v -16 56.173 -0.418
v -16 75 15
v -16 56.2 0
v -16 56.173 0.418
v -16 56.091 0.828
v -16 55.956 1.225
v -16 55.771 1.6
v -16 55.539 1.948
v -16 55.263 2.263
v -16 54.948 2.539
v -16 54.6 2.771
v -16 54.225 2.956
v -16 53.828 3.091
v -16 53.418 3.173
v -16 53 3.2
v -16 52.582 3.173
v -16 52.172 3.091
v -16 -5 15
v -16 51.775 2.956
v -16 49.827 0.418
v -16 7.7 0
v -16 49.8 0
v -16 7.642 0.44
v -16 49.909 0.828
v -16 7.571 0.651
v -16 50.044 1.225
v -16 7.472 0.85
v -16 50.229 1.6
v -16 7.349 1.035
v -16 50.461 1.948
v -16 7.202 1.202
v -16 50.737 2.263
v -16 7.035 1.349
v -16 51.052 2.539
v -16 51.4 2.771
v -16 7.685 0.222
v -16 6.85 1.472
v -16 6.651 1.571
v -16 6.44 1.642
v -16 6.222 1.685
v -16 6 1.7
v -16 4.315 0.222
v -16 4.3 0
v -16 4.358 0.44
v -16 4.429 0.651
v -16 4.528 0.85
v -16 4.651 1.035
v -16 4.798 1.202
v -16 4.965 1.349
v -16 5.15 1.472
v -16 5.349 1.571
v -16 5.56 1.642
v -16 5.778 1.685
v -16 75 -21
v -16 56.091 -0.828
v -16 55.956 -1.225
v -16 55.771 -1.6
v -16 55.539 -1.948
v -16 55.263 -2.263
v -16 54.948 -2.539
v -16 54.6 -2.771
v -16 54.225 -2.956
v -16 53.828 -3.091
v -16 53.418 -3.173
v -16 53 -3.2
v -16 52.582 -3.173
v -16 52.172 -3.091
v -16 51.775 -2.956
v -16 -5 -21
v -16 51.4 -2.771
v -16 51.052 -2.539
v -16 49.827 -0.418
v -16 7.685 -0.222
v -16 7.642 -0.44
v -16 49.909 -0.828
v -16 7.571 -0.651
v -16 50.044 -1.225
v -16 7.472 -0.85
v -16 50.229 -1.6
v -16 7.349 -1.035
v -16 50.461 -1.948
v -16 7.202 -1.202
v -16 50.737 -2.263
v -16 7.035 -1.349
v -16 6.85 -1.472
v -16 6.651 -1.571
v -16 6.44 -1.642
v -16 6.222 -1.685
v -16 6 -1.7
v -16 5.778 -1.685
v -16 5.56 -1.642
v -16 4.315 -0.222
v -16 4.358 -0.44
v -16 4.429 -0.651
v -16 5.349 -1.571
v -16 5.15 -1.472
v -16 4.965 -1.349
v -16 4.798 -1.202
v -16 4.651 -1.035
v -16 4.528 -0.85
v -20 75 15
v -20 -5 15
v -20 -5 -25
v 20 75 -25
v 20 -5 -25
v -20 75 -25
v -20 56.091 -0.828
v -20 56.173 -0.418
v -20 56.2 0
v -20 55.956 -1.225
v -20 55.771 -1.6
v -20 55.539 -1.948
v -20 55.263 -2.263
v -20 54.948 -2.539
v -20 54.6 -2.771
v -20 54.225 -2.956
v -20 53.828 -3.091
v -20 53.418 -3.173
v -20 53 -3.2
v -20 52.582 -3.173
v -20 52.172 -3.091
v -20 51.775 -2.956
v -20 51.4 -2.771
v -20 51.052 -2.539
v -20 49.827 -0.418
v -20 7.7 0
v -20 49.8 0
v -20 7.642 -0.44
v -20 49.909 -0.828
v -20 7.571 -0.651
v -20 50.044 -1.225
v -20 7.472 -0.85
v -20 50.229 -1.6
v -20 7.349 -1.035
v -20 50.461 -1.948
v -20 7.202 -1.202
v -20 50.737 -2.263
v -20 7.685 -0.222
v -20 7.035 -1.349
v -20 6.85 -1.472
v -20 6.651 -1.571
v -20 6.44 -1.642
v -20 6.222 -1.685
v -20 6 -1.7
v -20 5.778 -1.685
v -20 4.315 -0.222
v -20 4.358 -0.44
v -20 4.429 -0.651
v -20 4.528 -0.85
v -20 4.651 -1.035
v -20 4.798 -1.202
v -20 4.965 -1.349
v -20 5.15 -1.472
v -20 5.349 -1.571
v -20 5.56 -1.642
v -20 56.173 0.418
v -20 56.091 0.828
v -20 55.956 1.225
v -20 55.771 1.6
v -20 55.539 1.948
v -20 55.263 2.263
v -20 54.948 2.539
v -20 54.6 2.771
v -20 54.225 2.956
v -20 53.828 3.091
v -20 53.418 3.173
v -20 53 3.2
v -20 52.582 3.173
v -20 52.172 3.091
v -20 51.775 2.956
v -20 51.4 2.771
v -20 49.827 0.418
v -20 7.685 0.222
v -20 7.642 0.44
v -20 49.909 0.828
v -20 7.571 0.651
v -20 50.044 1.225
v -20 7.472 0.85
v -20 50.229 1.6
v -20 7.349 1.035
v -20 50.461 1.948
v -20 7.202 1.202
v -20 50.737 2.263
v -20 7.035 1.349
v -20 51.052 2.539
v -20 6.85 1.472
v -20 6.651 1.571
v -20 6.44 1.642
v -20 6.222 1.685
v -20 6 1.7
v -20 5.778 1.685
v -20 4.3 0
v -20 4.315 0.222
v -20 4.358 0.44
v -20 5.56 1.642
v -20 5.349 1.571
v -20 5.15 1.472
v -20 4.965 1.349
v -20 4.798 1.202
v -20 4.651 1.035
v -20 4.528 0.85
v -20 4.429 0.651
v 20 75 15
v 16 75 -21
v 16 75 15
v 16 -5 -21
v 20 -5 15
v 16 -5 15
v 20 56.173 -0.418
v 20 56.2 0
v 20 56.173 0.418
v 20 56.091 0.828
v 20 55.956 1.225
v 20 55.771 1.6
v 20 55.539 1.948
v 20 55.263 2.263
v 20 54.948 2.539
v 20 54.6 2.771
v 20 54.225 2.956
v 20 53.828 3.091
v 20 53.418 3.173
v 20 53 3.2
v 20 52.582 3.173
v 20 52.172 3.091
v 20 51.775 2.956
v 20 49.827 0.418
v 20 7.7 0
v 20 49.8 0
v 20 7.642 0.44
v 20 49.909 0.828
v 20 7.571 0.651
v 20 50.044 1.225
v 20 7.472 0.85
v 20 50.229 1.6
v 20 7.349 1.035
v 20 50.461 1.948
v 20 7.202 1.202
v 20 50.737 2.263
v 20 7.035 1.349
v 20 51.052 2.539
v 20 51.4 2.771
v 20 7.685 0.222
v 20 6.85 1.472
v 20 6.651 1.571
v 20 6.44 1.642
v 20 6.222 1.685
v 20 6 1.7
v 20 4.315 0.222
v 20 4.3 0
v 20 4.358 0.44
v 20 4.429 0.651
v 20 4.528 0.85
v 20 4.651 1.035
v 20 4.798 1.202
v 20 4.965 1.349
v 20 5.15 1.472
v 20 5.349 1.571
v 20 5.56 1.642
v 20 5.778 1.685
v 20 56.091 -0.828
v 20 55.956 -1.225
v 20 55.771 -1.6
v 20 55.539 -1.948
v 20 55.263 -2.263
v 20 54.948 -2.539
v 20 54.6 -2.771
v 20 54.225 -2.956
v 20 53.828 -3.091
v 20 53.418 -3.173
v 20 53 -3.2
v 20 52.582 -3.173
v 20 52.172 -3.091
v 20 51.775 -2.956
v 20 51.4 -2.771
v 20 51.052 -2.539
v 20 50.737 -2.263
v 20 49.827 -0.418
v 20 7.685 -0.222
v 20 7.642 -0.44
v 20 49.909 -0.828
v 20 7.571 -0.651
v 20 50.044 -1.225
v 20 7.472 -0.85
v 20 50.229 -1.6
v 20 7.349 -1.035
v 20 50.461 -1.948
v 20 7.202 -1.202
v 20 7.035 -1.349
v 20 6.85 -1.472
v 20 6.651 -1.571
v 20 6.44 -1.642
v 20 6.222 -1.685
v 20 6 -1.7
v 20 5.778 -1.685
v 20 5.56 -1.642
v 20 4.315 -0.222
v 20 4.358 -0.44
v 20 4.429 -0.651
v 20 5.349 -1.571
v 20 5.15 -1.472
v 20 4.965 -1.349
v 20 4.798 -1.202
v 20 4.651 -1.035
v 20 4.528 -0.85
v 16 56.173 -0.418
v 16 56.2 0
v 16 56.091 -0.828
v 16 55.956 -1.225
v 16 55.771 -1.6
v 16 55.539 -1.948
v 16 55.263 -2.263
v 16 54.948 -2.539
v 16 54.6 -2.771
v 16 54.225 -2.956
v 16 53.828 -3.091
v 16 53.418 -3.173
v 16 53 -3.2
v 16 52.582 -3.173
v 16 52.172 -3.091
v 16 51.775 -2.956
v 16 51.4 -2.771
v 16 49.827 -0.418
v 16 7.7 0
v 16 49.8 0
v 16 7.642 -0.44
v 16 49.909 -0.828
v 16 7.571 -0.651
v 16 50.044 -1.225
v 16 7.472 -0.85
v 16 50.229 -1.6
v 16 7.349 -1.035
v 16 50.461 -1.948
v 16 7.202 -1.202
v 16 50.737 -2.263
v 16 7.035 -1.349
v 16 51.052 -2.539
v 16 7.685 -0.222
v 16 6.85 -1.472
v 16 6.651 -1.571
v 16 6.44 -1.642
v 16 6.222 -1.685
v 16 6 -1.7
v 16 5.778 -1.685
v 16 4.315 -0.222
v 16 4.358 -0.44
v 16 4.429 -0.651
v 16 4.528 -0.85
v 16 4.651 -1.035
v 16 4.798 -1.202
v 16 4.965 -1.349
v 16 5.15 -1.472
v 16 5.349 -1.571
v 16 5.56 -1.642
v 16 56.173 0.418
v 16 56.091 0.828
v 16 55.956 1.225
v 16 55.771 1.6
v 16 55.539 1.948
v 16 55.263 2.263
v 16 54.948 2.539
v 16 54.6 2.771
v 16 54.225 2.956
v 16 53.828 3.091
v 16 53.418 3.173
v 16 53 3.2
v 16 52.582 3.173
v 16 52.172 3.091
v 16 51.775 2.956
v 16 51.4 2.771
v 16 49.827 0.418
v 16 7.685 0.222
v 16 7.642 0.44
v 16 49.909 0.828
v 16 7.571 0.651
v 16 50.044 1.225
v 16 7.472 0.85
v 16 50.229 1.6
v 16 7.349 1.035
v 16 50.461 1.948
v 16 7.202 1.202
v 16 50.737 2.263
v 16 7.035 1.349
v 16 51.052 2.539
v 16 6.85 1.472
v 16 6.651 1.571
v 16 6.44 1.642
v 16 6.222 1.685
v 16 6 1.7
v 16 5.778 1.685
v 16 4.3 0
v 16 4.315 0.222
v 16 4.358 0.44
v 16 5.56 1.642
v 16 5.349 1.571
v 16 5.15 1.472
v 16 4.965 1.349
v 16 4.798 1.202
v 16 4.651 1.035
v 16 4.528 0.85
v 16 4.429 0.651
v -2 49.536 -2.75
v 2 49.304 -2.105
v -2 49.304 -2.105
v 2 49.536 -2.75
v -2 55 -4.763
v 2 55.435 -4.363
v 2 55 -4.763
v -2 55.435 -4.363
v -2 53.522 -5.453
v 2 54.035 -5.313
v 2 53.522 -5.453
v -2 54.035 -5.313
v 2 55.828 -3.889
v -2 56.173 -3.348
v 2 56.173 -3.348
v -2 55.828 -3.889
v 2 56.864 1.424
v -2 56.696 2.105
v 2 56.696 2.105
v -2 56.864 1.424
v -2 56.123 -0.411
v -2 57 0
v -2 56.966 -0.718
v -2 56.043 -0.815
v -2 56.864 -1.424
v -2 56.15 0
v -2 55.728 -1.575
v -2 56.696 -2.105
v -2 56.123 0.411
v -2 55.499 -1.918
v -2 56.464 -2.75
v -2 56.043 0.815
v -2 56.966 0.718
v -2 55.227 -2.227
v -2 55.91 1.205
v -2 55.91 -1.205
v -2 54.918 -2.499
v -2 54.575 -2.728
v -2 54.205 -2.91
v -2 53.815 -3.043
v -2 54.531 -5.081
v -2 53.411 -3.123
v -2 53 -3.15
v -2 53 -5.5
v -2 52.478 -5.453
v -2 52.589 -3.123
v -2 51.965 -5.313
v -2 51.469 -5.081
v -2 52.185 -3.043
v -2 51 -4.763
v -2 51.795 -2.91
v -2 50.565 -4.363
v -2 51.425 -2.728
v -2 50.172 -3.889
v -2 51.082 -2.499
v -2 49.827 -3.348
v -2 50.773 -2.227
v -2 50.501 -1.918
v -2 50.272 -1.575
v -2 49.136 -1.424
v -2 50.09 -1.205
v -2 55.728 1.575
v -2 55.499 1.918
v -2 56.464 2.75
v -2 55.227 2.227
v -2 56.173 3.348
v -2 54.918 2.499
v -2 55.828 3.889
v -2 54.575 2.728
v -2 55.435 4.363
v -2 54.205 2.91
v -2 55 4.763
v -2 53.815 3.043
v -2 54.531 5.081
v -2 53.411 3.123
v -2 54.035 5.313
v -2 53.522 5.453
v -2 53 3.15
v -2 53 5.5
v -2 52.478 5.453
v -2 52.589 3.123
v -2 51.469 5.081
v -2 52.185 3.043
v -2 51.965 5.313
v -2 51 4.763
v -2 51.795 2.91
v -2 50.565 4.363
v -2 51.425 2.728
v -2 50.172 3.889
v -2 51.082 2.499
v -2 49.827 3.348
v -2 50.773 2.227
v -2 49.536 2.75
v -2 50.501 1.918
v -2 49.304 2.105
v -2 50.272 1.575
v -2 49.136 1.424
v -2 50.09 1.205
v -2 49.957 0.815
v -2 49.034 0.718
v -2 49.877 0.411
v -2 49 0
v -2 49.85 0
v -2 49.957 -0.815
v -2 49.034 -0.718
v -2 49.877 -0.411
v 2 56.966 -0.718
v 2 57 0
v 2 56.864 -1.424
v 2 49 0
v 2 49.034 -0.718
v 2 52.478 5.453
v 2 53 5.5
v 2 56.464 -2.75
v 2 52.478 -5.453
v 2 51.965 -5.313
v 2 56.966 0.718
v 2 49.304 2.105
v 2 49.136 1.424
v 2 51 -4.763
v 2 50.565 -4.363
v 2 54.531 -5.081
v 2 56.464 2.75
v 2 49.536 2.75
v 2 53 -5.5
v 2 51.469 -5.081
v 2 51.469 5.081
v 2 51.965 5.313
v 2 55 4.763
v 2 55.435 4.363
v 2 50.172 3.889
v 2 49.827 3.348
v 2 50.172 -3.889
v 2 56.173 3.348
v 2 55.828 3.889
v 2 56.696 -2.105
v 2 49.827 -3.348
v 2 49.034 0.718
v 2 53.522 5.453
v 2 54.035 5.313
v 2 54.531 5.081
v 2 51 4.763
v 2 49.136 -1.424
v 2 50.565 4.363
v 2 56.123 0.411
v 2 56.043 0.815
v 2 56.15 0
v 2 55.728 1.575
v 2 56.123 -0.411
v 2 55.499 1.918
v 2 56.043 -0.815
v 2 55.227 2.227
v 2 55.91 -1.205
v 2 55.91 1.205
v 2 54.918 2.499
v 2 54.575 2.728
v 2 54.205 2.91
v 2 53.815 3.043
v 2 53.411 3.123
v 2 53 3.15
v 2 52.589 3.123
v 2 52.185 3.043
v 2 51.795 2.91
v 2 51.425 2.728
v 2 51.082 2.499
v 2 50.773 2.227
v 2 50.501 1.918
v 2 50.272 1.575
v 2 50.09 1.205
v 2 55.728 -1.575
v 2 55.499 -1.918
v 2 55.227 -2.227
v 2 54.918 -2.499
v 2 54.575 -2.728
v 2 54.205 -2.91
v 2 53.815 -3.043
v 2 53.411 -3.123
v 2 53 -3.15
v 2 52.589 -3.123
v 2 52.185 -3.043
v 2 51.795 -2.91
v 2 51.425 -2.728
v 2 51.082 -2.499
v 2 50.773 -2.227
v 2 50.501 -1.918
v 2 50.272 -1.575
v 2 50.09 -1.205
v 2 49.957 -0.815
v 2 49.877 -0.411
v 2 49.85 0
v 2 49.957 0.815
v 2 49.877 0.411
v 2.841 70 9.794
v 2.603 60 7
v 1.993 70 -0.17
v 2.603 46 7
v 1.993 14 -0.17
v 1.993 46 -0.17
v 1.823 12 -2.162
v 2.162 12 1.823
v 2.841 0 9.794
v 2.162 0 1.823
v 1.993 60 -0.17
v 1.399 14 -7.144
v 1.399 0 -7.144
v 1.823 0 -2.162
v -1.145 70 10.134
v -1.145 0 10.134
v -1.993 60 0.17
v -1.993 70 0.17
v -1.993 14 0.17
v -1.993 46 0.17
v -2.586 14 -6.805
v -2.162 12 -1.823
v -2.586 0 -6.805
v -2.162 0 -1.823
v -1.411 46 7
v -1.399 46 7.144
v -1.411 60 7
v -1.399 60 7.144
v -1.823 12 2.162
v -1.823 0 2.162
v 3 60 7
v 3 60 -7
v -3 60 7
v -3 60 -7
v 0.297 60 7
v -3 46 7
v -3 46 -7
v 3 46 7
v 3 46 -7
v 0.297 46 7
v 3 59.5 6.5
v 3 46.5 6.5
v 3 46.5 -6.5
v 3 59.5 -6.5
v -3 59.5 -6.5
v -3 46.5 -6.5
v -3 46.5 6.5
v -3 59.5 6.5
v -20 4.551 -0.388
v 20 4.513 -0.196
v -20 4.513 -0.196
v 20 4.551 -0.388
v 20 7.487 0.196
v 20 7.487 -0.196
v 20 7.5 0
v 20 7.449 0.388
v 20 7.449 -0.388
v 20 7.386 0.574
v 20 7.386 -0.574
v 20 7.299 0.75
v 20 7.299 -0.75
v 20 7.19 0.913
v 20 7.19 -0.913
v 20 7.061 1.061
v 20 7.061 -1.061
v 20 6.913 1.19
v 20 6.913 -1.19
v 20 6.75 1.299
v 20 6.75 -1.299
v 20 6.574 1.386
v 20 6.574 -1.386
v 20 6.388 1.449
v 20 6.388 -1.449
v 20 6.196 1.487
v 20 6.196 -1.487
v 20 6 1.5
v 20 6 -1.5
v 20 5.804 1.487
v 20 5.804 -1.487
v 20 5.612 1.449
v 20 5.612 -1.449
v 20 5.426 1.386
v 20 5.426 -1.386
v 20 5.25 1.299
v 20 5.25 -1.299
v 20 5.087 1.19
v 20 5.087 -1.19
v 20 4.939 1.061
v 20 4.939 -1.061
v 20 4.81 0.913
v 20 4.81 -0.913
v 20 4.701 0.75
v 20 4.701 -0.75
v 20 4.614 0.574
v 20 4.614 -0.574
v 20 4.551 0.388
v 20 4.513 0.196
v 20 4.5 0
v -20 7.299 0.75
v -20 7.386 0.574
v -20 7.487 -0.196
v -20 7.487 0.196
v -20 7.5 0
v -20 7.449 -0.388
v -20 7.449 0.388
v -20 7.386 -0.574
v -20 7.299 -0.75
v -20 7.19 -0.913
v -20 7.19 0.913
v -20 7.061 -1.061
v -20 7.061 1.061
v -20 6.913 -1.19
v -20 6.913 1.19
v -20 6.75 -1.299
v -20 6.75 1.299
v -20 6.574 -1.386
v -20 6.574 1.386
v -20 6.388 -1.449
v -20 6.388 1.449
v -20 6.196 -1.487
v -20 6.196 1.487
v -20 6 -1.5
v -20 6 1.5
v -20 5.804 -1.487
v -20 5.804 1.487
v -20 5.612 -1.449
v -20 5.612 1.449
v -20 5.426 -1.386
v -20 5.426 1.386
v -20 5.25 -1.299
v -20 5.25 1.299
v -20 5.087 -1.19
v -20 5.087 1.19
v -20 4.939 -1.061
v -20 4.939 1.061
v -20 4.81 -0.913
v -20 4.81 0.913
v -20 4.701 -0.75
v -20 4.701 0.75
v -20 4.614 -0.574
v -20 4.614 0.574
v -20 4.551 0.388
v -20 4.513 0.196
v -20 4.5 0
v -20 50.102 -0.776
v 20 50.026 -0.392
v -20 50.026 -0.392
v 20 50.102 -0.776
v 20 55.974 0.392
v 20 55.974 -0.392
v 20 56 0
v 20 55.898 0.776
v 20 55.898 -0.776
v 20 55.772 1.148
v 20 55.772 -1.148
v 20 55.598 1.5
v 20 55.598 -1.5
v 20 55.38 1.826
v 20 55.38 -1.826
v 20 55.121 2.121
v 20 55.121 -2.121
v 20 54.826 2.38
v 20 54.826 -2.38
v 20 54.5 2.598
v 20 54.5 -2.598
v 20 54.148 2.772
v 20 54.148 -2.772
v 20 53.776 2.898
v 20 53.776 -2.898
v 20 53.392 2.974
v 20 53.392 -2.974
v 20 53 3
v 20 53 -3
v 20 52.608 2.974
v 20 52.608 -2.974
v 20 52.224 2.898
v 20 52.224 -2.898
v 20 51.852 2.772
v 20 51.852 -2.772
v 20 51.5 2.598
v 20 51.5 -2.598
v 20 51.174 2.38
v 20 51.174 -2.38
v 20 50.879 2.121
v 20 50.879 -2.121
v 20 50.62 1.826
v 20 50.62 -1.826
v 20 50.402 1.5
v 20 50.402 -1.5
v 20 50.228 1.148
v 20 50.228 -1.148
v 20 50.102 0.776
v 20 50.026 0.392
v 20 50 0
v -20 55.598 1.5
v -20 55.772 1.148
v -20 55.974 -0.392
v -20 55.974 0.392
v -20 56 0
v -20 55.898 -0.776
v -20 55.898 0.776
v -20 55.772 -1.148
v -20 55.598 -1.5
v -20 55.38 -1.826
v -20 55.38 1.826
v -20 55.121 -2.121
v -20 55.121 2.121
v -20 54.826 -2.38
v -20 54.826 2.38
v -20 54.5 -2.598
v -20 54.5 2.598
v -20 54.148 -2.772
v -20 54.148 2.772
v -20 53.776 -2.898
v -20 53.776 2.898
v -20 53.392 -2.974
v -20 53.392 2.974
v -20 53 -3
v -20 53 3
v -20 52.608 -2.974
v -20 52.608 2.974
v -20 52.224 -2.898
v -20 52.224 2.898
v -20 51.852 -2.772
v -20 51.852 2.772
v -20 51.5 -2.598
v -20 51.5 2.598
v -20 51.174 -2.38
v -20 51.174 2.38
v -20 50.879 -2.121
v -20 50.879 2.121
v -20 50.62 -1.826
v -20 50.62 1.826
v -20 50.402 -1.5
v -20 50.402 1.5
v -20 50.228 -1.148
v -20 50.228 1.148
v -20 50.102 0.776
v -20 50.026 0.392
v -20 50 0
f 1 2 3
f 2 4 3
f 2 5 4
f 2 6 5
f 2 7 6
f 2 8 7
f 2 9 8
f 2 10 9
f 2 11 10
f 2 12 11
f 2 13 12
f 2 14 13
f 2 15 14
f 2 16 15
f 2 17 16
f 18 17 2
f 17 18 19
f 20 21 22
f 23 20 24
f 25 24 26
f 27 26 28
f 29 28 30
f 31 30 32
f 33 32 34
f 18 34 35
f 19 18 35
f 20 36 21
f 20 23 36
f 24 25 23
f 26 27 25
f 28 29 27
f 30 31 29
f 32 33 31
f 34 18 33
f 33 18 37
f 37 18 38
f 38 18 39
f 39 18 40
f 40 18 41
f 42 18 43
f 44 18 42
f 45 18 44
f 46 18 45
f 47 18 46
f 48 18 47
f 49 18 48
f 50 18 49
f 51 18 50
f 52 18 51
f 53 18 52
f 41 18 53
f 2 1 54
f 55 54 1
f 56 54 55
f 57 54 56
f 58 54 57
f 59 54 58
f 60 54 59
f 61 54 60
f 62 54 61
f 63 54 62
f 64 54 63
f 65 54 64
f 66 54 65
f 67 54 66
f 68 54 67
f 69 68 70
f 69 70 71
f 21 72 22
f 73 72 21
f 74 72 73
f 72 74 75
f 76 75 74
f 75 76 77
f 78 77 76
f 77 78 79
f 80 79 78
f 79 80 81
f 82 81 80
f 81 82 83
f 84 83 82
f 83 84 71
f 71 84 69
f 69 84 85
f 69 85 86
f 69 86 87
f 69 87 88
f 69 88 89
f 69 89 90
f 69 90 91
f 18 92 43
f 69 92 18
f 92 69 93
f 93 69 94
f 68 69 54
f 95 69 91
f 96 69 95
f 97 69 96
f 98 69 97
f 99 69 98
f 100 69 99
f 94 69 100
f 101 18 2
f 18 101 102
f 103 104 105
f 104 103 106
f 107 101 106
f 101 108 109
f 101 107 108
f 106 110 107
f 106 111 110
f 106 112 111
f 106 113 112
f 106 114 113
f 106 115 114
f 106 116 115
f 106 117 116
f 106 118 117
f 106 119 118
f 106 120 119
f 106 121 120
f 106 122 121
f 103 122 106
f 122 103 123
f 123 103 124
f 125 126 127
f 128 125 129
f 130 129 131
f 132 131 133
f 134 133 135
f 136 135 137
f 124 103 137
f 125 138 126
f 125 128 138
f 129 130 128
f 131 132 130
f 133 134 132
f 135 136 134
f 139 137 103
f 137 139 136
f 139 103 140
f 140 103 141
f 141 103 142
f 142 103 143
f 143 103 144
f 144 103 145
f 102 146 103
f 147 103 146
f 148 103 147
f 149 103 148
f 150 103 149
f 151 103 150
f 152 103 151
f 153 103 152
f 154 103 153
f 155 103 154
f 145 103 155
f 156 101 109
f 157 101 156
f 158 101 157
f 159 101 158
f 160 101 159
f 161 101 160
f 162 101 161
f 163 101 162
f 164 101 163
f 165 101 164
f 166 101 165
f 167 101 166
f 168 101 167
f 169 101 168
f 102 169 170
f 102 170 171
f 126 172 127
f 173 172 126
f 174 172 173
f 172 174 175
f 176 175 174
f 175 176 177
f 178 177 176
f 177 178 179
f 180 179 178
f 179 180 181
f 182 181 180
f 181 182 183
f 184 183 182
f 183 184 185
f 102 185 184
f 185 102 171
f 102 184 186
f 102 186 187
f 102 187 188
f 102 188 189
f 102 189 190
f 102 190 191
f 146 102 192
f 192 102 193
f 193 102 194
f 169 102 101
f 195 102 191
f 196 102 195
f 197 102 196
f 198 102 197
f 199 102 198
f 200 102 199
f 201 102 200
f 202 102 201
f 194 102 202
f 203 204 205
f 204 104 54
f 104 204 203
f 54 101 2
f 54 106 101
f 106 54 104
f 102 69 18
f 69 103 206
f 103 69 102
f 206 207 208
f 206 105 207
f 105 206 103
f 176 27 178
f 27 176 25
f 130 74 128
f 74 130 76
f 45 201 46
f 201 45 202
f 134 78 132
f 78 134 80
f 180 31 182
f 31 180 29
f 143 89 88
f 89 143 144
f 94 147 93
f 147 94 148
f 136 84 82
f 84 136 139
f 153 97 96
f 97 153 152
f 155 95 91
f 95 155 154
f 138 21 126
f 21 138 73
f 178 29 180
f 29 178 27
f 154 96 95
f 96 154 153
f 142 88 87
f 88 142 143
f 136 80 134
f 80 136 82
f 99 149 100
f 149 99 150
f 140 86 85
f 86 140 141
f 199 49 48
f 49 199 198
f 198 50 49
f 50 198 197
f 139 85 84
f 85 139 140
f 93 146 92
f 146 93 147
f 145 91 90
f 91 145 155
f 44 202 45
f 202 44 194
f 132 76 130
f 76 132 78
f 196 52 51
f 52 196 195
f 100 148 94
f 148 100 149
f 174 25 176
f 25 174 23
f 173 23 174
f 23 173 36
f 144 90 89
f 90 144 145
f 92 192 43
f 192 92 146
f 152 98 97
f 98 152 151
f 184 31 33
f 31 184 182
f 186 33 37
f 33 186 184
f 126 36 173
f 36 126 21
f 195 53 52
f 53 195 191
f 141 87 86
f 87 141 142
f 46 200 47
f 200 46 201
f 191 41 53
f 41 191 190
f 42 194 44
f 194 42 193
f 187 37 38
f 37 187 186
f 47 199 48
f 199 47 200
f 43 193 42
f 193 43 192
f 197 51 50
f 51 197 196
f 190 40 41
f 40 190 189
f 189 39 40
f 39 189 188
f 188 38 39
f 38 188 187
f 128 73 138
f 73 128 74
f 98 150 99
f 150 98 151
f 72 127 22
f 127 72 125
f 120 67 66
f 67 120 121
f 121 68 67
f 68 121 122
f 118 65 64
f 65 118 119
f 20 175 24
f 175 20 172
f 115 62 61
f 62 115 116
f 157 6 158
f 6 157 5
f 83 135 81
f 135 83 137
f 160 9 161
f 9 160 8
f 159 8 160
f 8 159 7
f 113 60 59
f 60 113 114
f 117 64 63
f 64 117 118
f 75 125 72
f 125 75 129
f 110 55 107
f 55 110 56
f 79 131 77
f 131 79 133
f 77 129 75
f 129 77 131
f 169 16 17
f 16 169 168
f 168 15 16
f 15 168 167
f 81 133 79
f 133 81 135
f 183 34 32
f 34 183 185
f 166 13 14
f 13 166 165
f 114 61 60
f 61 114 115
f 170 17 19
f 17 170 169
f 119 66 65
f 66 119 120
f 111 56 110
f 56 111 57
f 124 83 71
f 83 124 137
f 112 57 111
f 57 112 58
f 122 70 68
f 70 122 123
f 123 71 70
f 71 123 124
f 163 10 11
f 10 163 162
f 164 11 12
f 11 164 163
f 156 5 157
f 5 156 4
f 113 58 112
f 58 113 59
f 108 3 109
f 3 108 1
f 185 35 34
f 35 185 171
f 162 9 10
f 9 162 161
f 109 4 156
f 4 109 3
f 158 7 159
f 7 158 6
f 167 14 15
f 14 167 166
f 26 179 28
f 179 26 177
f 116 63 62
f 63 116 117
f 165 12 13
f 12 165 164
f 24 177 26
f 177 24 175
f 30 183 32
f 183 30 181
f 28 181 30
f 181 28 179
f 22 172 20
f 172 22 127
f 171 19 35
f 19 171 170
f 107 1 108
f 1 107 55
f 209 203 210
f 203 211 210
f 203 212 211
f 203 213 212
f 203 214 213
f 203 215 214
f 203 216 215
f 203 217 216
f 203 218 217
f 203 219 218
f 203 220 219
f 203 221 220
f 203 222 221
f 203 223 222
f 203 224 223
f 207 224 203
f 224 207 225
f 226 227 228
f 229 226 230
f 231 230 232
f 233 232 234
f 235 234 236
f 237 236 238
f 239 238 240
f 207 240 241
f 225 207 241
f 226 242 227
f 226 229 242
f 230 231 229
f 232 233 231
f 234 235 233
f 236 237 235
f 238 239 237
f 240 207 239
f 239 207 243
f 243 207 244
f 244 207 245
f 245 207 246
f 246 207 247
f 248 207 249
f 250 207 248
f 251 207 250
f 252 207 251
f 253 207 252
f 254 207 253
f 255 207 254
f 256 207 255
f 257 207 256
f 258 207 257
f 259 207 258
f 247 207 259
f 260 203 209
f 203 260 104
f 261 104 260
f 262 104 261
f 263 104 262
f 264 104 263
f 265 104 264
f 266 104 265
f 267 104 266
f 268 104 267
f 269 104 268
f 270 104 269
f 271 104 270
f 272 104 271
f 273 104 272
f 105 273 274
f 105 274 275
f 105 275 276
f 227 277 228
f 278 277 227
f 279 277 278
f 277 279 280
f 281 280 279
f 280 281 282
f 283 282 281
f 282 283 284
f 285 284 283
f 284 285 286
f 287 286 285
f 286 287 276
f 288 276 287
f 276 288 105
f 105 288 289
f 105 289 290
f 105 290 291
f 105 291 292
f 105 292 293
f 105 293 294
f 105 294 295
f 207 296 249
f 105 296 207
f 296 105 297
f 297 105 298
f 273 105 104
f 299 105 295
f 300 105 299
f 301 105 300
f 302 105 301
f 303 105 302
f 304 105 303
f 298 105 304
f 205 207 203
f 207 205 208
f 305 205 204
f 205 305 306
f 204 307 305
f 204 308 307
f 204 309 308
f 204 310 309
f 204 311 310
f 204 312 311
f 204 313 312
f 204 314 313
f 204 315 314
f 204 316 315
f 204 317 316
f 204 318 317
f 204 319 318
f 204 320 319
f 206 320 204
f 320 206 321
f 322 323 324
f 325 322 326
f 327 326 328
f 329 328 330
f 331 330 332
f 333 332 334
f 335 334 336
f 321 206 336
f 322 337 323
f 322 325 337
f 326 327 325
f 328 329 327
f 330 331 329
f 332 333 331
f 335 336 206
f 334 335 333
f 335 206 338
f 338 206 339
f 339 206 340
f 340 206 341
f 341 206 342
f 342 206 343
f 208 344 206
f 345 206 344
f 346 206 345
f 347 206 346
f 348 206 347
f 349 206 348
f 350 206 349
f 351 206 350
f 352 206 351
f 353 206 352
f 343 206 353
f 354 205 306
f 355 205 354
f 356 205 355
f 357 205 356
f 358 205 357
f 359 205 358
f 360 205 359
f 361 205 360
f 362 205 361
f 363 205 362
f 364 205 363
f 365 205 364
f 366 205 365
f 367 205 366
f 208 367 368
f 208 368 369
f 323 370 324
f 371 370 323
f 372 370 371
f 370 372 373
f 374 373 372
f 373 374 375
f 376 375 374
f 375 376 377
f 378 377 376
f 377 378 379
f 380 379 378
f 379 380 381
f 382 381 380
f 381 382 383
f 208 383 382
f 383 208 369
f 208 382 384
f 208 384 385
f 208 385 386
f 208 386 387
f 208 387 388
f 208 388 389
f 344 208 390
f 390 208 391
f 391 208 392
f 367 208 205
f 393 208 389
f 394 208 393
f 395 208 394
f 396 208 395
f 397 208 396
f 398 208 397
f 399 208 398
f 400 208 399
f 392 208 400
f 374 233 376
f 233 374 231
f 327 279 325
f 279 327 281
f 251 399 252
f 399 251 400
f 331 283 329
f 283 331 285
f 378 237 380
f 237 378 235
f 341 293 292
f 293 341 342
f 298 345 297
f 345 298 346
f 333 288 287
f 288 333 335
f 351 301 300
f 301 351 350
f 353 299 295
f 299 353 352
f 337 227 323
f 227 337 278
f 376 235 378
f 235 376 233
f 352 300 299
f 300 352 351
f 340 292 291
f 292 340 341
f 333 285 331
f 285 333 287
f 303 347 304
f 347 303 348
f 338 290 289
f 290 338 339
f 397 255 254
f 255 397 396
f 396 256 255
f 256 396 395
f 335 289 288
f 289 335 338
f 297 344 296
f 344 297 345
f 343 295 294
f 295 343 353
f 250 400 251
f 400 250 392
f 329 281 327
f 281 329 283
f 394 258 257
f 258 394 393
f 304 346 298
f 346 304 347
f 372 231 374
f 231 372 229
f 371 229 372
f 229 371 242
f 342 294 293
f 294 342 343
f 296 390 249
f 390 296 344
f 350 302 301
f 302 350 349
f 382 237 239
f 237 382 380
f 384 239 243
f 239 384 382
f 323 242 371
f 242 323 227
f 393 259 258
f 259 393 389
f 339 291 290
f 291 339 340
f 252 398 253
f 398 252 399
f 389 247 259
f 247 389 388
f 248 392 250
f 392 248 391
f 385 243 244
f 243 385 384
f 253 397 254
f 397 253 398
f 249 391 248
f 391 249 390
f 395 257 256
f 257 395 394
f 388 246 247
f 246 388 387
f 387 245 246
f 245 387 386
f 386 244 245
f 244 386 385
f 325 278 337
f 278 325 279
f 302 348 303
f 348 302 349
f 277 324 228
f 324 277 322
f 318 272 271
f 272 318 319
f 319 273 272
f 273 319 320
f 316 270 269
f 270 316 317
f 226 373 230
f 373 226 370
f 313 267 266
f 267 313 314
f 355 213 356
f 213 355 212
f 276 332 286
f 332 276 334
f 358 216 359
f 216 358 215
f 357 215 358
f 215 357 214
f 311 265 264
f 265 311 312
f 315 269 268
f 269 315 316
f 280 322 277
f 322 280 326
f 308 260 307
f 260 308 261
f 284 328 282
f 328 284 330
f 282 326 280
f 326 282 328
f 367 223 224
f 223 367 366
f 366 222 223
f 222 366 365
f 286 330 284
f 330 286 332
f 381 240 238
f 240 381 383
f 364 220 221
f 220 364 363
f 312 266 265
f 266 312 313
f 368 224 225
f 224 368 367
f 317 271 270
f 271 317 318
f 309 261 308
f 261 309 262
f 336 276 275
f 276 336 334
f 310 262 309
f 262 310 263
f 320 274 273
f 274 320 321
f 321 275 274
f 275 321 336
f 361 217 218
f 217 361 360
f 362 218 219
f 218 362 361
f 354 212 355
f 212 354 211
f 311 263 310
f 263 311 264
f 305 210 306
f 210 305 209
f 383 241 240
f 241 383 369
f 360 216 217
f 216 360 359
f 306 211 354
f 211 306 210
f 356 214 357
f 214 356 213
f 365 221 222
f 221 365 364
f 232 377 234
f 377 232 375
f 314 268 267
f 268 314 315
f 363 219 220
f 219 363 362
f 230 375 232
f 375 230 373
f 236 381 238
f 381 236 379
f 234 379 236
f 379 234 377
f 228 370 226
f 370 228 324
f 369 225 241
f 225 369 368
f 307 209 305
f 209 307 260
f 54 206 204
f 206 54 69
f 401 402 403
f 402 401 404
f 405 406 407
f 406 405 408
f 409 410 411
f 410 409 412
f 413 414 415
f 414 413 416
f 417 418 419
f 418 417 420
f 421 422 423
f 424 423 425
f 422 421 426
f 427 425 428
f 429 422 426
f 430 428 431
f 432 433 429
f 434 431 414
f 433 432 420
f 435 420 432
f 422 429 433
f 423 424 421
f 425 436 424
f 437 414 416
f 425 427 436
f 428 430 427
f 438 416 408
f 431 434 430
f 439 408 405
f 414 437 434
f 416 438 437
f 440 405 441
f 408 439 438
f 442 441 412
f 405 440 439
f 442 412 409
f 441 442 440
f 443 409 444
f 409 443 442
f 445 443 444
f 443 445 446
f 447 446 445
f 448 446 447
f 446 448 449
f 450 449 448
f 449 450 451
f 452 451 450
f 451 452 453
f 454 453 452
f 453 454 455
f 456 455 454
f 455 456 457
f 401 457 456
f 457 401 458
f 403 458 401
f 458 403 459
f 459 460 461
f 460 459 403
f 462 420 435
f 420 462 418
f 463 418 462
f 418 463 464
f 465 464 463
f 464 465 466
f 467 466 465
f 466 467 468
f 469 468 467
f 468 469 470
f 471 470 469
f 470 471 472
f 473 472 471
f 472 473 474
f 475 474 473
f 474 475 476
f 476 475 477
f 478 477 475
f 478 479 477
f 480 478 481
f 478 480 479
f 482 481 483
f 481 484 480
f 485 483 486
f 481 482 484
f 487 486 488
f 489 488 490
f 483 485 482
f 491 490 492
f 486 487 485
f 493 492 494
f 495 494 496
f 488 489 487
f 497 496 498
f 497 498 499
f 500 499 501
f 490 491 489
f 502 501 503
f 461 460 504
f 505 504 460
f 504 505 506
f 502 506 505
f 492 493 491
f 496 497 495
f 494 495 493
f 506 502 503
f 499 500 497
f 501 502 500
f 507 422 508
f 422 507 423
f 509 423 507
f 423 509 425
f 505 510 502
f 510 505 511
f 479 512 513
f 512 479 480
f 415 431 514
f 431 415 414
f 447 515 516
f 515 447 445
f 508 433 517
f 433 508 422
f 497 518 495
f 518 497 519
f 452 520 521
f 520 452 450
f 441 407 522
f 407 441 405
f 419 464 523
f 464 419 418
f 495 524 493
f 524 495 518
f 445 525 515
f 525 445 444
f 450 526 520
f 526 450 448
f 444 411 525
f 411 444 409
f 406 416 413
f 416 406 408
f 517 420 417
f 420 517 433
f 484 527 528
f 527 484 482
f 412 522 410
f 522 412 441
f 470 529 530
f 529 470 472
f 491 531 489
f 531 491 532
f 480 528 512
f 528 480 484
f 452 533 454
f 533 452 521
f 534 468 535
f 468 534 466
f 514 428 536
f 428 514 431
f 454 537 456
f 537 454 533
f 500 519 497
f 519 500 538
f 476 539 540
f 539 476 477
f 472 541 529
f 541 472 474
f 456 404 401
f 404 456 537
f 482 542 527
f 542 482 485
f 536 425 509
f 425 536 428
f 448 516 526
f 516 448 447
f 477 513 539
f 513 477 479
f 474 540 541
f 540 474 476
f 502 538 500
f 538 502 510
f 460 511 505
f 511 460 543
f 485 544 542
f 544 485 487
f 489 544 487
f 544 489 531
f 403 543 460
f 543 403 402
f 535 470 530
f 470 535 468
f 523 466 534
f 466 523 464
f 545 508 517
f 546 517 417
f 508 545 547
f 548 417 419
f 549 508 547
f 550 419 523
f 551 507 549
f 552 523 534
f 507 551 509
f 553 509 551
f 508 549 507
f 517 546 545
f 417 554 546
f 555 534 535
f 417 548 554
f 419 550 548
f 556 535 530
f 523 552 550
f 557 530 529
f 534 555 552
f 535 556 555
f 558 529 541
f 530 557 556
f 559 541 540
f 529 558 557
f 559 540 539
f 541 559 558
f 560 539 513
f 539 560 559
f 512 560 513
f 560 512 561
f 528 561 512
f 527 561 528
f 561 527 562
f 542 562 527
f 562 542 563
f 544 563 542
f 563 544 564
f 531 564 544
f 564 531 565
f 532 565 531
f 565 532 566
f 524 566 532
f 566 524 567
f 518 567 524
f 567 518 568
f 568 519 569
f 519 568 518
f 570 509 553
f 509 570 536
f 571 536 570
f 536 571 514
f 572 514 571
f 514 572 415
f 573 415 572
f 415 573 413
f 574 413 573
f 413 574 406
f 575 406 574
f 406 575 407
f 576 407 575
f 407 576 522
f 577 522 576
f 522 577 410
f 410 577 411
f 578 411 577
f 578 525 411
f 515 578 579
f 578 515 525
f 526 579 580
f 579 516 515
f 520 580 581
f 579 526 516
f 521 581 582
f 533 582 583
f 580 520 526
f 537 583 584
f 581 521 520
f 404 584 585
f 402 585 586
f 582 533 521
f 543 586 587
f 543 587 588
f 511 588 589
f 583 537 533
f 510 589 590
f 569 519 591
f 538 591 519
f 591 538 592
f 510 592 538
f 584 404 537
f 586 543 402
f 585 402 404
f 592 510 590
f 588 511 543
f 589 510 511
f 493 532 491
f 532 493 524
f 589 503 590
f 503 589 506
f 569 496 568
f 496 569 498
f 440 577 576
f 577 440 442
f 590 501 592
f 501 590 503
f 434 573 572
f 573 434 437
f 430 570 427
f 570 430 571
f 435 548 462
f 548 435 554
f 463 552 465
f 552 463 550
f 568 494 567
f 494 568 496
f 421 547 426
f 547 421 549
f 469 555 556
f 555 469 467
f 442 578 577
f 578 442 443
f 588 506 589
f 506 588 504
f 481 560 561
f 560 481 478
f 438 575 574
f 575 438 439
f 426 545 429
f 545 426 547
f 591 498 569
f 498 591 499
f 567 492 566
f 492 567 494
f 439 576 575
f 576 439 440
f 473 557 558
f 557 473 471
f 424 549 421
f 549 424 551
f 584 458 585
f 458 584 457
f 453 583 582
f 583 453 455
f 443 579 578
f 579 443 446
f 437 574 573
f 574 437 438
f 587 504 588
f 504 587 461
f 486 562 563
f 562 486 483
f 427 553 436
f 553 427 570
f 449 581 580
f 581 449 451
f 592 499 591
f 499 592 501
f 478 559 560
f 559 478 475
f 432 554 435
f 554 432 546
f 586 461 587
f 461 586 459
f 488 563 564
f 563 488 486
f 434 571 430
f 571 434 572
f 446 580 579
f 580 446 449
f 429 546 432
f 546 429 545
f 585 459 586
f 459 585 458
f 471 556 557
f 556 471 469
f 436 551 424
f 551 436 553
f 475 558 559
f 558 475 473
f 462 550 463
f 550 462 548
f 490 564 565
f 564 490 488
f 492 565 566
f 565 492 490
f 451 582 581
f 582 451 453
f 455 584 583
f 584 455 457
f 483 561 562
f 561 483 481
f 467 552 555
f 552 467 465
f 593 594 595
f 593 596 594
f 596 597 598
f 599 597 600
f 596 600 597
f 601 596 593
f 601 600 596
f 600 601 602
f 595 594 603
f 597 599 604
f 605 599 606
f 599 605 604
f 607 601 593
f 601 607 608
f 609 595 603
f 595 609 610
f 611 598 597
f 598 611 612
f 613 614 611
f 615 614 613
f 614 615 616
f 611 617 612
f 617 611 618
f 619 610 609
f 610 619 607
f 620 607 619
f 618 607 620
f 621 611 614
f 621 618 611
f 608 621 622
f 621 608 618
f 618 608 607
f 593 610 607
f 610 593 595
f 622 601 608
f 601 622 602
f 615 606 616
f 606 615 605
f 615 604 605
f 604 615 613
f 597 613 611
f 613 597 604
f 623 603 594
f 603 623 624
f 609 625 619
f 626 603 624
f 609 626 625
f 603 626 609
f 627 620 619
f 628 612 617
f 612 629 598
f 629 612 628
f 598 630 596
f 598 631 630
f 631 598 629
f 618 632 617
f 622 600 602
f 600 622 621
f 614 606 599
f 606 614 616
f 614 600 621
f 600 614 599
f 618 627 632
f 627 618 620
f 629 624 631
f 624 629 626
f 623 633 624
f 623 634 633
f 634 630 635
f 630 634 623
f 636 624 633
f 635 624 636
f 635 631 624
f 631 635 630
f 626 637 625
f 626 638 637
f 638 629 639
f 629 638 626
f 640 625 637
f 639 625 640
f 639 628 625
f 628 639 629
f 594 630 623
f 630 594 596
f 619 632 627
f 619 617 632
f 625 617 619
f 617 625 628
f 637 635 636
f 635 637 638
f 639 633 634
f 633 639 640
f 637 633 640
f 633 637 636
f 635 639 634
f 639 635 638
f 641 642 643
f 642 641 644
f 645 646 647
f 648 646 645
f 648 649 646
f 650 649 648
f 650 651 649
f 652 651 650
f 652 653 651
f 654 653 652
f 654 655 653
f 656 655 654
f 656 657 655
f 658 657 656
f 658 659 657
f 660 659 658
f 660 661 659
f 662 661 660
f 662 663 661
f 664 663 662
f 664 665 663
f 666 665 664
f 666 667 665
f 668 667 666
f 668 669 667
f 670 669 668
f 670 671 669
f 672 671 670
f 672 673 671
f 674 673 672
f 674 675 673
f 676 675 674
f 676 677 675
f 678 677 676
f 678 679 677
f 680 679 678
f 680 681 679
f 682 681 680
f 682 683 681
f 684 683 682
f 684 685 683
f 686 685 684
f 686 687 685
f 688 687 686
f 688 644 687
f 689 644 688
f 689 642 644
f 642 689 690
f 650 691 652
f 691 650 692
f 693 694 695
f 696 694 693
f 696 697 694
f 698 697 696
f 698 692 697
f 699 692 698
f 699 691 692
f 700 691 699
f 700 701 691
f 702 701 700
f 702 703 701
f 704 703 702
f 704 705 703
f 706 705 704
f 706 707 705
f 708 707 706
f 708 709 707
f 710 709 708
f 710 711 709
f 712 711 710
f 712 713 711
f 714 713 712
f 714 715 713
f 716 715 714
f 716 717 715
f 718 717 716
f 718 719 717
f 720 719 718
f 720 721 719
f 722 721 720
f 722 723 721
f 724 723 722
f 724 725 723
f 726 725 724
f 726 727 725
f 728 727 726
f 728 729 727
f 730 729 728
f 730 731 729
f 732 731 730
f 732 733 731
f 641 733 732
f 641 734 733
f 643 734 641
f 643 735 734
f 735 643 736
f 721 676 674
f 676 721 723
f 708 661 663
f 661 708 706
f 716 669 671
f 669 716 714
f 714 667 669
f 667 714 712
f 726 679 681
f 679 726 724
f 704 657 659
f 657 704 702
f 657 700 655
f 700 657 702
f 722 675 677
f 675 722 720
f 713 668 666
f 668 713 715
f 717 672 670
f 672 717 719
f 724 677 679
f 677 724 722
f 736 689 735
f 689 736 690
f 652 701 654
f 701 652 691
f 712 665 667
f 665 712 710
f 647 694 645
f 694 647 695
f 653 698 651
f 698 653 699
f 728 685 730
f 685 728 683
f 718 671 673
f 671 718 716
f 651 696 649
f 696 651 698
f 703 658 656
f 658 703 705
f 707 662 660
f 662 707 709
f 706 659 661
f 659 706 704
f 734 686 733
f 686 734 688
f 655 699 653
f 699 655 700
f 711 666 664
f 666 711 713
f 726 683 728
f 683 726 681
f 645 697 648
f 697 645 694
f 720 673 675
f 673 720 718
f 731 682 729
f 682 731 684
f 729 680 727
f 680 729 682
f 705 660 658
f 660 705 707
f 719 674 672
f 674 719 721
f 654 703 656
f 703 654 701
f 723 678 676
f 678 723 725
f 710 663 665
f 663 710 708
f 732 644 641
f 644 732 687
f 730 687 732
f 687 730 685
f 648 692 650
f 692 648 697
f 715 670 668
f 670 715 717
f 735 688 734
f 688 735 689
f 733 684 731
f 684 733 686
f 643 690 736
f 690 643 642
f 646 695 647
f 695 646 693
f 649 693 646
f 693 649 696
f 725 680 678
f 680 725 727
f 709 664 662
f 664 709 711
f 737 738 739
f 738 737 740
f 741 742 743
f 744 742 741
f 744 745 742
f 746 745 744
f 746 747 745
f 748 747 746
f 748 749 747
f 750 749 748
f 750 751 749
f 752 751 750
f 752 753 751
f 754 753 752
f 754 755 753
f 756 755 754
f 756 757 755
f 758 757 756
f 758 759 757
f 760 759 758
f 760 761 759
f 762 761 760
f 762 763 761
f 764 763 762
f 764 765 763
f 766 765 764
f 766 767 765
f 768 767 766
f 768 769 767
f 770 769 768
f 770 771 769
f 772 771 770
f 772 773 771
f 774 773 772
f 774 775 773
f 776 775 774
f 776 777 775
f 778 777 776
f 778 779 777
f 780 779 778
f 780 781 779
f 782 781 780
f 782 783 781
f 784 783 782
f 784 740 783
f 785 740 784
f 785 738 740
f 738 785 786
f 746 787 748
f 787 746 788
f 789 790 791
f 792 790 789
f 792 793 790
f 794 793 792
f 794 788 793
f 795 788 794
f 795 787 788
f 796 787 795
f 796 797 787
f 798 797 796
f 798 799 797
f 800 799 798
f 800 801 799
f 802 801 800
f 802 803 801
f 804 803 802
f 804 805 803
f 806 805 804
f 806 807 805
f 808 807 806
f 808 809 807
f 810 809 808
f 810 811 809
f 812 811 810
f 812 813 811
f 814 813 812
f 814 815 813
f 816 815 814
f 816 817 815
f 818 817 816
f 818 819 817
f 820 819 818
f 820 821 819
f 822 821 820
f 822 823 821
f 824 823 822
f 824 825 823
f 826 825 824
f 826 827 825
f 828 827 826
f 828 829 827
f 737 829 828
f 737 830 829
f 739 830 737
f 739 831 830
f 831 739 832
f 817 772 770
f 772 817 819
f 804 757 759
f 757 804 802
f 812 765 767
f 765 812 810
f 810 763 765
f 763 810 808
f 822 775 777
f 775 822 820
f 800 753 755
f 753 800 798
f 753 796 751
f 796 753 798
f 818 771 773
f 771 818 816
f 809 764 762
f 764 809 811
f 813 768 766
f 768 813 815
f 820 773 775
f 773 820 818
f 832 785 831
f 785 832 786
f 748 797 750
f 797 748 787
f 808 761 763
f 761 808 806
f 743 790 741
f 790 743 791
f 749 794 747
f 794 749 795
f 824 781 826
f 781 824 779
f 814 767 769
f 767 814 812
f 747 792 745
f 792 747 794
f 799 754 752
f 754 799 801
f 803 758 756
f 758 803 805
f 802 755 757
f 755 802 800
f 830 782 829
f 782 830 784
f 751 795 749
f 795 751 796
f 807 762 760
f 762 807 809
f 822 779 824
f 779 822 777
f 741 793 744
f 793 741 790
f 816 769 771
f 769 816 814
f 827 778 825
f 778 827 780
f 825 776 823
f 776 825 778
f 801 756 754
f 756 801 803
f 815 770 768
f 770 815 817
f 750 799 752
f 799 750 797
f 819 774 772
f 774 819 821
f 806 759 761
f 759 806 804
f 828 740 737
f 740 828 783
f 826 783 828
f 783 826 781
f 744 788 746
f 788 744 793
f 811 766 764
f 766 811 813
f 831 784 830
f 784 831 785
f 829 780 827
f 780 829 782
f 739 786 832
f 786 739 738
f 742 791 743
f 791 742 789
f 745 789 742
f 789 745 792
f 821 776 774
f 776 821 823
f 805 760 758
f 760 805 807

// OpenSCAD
/*
 * SINGLE WAVE + CAM HOUSING TEST
 *
 * Tests the v4 mechanism:
 * - Elliptical cam INSIDE square housing
 * - Cam contacts all 4 walls
 * - Wave pivots on hinge slot
 * - Compound motion (Z + Y)
 *
 * This MUST work before scaling to 22 waves.
 */

// ============================================
// ANIMATION
// ============================================

MANUAL_ANGLE = -1;
theta = (MANUAL_ANGLE >= 0) ? MANUAL_ANGLE : $t * 360;

// ============================================
// SHOW/HIDE
// ============================================

SHOW_WAVE = true;
SHOW_CAM = true;
SHOW_HINGE_AXLE = true;
SHOW_CAMSHAFT = true;
SHOW_FRAME = true;
SHOW_HOUSING_OUTLINE = true;  // Debug: show housing boundary

// ============================================
// PARAMETERS (from geometry checklist)
// ============================================

// Wave
WAVE_LENGTH = 70;
WAVE_BODY_HEIGHT = 10;
WAVE_THICKNESS = 4;

// Hinge slot
HINGE_SLOT_LENGTH = 12;
HINGE_SLOT_HEIGHT = 4;
HINGE_SLOT_CENTER_Y = 6;
HINGE_SLOT_CENTER_Z = 0;

// Cam housing (SQUARE)
CAM_HOUSING_SIZE = 14;
CAM_HOUSING_CENTER_Y = 53;
CAM_HOUSING_CENTER_Z = 0;

// Shafts
HINGE_AXLE_DIA = 3;
CAMSHAFT_DIA = 6;

// Cam (using middle-dramatic size for test)
CAM_MAJOR = 11;    // Test with middle size
CAM_MINOR = 8;
CAM_THICKNESS = 4;

// Frame
FRAME_WIDTH = 40;
FRAME_DEPTH = 80;
FRAME_HEIGHT = 40;
FRAME_WALL = 4;

$fn = 48;

// ============================================
// COLORS
// ============================================

C_WAVE = [0.75, 0.6, 0.45];
C_CAM = [0.8, 0.5, 0.2];
C_AXLE = [0.5, 0.5, 0.55];
C_FRAME = [0.3, 0.25, 0.2];
C_DEBUG = [1, 0, 0, 0.3];

// ============================================
// MOTION CALCULATIONS
// ============================================

// Lever arm (distance from hinge to cam)
LEVER_ARM = CAM_HOUSING_CENTER_Y - HINGE_SLOT_CENTER_Y;  // 47mm

// Cam push amount at current angle
cam_push_z = (CAM_MAJOR / 2) * sin(theta);
cam_push_y = (CAM_MINOR / 2) * cos(theta);

// Wave angles from cam push
wave_angle_pitch = atan2(cam_push_z, LEVER_ARM);  // Up/down tilt
wave_angle_roll = atan2(cam_push_y, LEVER_ARM);   // Toward/away tilt

// ============================================
// MODULES
// ============================================

// Wave slat with cutouts
module wave_slat() {
    color(C_WAVE)
    // Pivot around hinge center
    translate([0, HINGE_SLOT_CENTER_Y, HINGE_SLOT_CENTER_Z])
        rotate([wave_angle_pitch, wave_angle_roll, 0])
            translate([0, -HINGE_SLOT_CENTER_Y, -HINGE_SLOT_CENTER_Z])
                difference() {
                    union() {
                        // Wave body (above baseline)
                        translate([-WAVE_THICKNESS/2, 0, 0])
                            cube([WAVE_THICKNESS, WAVE_LENGTH, WAVE_BODY_HEIGHT]);

                        // Extension for hinge slot
                        translate([-WAVE_THICKNESS/2, 0, -CAM_HOUSING_SIZE/2])
                            cube([WAVE_THICKNESS, HINGE_SLOT_LENGTH + 2, CAM_HOUSING_SIZE/2]);

                        // Extension for cam housing
                        translate([-WAVE_THICKNESS/2, CAM_HOUSING_CENTER_Y - CAM_HOUSING_SIZE/2, -CAM_HOUSING_SIZE/2])
                            cube([WAVE_THICKNESS, CAM_HOUSING_SIZE, CAM_HOUSING_SIZE/2]);
                    }

                    // Hinge slot cutout
                    translate([-WAVE_THICKNESS/2 - 1,
                               HINGE_SLOT_CENTER_Y - HINGE_SLOT_LENGTH/2,
                               HINGE_SLOT_CENTER_Z - HINGE_SLOT_HEIGHT/2])
                        cube([WAVE_THICKNESS + 2, HINGE_SLOT_LENGTH, HINGE_SLOT_HEIGHT]);

                    // Cam housing cutout (SQUARE)
                    translate([-WAVE_THICKNESS/2 - 1,
                               CAM_HOUSING_CENTER_Y - CAM_HOUSING_SIZE/2,
                               CAM_HOUSING_CENTER_Z - CAM_HOUSING_SIZE/2])
                        cube([WAVE_THICKNESS + 2, CAM_HOUSING_SIZE, CAM_HOUSING_SIZE]);
                }
}

// Elliptical cam
module cam() {
    color(C_CAM)
    translate([0, CAM_HOUSING_CENTER_Y, CAM_HOUSING_CENTER_Z])
        rotate([0, 90, 0])
            rotate([0, 0, theta])
                difference() {
                    // Elliptical disc
                    scale([CAM_MAJOR/10, CAM_MINOR/10, 1])
                        cylinder(r=5, h=CAM_THICKNESS, center=true);

                    // Shaft hole
                    cylinder(d=CAMSHAFT_DIA + 0.3, h=CAM_THICKNESS + 2, center=true);
                }
}

// Hinge axle
module hinge_axle() {
    color(C_AXLE)
    translate([-FRAME_WIDTH/2, HINGE_SLOT_CENTER_Y, HINGE_SLOT_CENTER_Z])
        rotate([0, 90, 0])
            cylinder(d=HINGE_AXLE_DIA, h=FRAME_WIDTH);
}

// Camshaft
module camshaft() {
    color(C_AXLE)
    translate([-FRAME_WIDTH/2, CAM_HOUSING_CENTER_Y, CAM_HOUSING_CENTER_Z])
        rotate([0, 90, 0])
            cylinder(d=CAMSHAFT_DIA, h=FRAME_WIDTH);
}

// Simple frame
module frame() {
    color(C_FRAME) {
        // Base
        translate([-FRAME_WIDTH/2, -5, -FRAME_HEIGHT/2 - 5])
            cube([FRAME_WIDTH, FRAME_DEPTH, FRAME_WALL]);

        // Left wall
        translate([-FRAME_WIDTH/2, -5, -FRAME_HEIGHT/2 - 5])
            difference() {
                cube([FRAME_WALL, FRAME_DEPTH, FRAME_HEIGHT]);
                // Hinge hole
                translate([-1, HINGE_SLOT_CENTER_Y + 5, FRAME_HEIGHT/2 + 5])
                    rotate([0, 90, 0])
                        cylinder(d=HINGE_AXLE_DIA + 0.4, h=FRAME_WALL + 2);
                // Camshaft hole
                translate([-1, CAM_HOUSING_CENTER_Y + 5, FRAME_HEIGHT/2 + 5])
                    rotate([0, 90, 0])
                        cylinder(d=CAMSHAFT_DIA + 0.4, h=FRAME_WALL + 2);
            }

        // Right wall
        translate([FRAME_WIDTH/2 - FRAME_WALL, -5, -FRAME_HEIGHT/2 - 5])
            difference() {
                cube([FRAME_WALL, FRAME_DEPTH, FRAME_HEIGHT]);
                // Hinge hole
                translate([-1, HINGE_SLOT_CENTER_Y + 5, FRAME_HEIGHT/2 + 5])
                    rotate([0, 90, 0])
                        cylinder(d=HINGE_AXLE_DIA + 0.4, h=FRAME_WALL + 2);
                // Camshaft hole
                translate([-1, CAM_HOUSING_CENTER_Y + 5, FRAME_HEIGHT/2 + 5])
                    rotate([0, 90, 0])
                        cylinder(d=CAMSHAFT_DIA + 0.4, h=FRAME_WALL + 2);
            }
    }
}

// Debug: housing outline (transparent)
module housing_outline() {
    color(C_DEBUG)
    translate([0, CAM_HOUSING_CENTER_Y, CAM_HOUSING_CENTER_Z])
        rotate([0, 90, 0])
            difference() {
                cube([CAM_HOUSING_SIZE, CAM_HOUSING_SIZE, WAVE_THICKNESS + 2], center=true);
                cube([CAM_HOUSING_SIZE - 1, CAM_HOUSING_SIZE - 1, WAVE_THICKNESS + 4], center=true);
            }
}

// ============================================
// ASSEMBLY
// ============================================

module single_wave_test() {
    if (SHOW_FRAME) frame();
    if (SHOW_HINGE_AXLE) hinge_axle();
    if (SHOW_CAMSHAFT) camshaft();
    if (SHOW_CAM) cam();
    if (SHOW_WAVE) wave_slat();
    if (SHOW_HOUSING_OUTLINE) housing_outline();
}

// ============================================
// RENDER
// ============================================

single_wave_test();

// ============================================
// DEBUG OUTPUT
// ============================================

echo("");
echo("╔════════════════════════════════════════════════════════════╗");
echo("║       SINGLE WAVE + CAM HOUSING TEST                       ║");
echo("╚════════════════════════════════════════════════════════════╝");
echo("");
echo("MECHANISM:");
echo("  Elliptical cam rotates INSIDE square housing");
echo("  Cam contacts all 4 walls → compound motion");
echo("");
echo("DIMENSIONS:");
echo(str("  Wave: ", WAVE_LENGTH, "×", WAVE_BODY_HEIGHT, "×", WAVE_THICKNESS, "mm"));
echo(str("  Hinge slot: ", HINGE_SLOT_LENGTH, "×", HINGE_SLOT_HEIGHT, "mm at Y=", HINGE_SLOT_CENTER_Y));
echo(str("  Cam housing: ", CAM_HOUSING_SIZE, "×", CAM_HOUSING_SIZE, "mm at Y=", CAM_HOUSING_CENTER_Y));
echo(str("  Cam: ", CAM_MAJOR, "×", CAM_MINOR, "mm (eccentricity=", CAM_MAJOR-CAM_MINOR, "mm)"));
echo("");
echo(str("Current angle: ", theta, "°"));
echo(str("Cam push Z: ", cam_push_z, "mm"));
echo(str("Cam push Y: ", cam_push_y, "mm"));
echo(str("Wave pitch angle: ", wave_angle_pitch, "°"));
echo(str("Wave roll angle: ", wave_angle_roll, "°"));
echo("");
echo("VERIFICATION:");
echo(str("  Cam fits in housing? Major ", CAM_MAJOR, " < ", CAM_HOUSING_SIZE, " = ",
         CAM_MAJOR < CAM_HOUSING_SIZE ? "YES" : "NO"));
echo(str("  Diagonal check (at 45°): ",
         CAM_MAJOR * 0.707 + CAM_MINOR * 0.707, " < ", CAM_HOUSING_SIZE, " = ",
         (CAM_MAJOR * 0.707 + CAM_MINOR * 0.707) < CAM_HOUSING_SIZE ? "PASS" : "JAM!"));
echo("");
echo("VISUAL CHECK:");
echo("  - Wave should rock UP/DOWN as cam rotates");
echo("  - Wave should tilt TOWARD/AWAY from viewer");
echo("  - Cam should stay INSIDE housing at all angles");
echo("  - No intersection between cam and housing walls");
